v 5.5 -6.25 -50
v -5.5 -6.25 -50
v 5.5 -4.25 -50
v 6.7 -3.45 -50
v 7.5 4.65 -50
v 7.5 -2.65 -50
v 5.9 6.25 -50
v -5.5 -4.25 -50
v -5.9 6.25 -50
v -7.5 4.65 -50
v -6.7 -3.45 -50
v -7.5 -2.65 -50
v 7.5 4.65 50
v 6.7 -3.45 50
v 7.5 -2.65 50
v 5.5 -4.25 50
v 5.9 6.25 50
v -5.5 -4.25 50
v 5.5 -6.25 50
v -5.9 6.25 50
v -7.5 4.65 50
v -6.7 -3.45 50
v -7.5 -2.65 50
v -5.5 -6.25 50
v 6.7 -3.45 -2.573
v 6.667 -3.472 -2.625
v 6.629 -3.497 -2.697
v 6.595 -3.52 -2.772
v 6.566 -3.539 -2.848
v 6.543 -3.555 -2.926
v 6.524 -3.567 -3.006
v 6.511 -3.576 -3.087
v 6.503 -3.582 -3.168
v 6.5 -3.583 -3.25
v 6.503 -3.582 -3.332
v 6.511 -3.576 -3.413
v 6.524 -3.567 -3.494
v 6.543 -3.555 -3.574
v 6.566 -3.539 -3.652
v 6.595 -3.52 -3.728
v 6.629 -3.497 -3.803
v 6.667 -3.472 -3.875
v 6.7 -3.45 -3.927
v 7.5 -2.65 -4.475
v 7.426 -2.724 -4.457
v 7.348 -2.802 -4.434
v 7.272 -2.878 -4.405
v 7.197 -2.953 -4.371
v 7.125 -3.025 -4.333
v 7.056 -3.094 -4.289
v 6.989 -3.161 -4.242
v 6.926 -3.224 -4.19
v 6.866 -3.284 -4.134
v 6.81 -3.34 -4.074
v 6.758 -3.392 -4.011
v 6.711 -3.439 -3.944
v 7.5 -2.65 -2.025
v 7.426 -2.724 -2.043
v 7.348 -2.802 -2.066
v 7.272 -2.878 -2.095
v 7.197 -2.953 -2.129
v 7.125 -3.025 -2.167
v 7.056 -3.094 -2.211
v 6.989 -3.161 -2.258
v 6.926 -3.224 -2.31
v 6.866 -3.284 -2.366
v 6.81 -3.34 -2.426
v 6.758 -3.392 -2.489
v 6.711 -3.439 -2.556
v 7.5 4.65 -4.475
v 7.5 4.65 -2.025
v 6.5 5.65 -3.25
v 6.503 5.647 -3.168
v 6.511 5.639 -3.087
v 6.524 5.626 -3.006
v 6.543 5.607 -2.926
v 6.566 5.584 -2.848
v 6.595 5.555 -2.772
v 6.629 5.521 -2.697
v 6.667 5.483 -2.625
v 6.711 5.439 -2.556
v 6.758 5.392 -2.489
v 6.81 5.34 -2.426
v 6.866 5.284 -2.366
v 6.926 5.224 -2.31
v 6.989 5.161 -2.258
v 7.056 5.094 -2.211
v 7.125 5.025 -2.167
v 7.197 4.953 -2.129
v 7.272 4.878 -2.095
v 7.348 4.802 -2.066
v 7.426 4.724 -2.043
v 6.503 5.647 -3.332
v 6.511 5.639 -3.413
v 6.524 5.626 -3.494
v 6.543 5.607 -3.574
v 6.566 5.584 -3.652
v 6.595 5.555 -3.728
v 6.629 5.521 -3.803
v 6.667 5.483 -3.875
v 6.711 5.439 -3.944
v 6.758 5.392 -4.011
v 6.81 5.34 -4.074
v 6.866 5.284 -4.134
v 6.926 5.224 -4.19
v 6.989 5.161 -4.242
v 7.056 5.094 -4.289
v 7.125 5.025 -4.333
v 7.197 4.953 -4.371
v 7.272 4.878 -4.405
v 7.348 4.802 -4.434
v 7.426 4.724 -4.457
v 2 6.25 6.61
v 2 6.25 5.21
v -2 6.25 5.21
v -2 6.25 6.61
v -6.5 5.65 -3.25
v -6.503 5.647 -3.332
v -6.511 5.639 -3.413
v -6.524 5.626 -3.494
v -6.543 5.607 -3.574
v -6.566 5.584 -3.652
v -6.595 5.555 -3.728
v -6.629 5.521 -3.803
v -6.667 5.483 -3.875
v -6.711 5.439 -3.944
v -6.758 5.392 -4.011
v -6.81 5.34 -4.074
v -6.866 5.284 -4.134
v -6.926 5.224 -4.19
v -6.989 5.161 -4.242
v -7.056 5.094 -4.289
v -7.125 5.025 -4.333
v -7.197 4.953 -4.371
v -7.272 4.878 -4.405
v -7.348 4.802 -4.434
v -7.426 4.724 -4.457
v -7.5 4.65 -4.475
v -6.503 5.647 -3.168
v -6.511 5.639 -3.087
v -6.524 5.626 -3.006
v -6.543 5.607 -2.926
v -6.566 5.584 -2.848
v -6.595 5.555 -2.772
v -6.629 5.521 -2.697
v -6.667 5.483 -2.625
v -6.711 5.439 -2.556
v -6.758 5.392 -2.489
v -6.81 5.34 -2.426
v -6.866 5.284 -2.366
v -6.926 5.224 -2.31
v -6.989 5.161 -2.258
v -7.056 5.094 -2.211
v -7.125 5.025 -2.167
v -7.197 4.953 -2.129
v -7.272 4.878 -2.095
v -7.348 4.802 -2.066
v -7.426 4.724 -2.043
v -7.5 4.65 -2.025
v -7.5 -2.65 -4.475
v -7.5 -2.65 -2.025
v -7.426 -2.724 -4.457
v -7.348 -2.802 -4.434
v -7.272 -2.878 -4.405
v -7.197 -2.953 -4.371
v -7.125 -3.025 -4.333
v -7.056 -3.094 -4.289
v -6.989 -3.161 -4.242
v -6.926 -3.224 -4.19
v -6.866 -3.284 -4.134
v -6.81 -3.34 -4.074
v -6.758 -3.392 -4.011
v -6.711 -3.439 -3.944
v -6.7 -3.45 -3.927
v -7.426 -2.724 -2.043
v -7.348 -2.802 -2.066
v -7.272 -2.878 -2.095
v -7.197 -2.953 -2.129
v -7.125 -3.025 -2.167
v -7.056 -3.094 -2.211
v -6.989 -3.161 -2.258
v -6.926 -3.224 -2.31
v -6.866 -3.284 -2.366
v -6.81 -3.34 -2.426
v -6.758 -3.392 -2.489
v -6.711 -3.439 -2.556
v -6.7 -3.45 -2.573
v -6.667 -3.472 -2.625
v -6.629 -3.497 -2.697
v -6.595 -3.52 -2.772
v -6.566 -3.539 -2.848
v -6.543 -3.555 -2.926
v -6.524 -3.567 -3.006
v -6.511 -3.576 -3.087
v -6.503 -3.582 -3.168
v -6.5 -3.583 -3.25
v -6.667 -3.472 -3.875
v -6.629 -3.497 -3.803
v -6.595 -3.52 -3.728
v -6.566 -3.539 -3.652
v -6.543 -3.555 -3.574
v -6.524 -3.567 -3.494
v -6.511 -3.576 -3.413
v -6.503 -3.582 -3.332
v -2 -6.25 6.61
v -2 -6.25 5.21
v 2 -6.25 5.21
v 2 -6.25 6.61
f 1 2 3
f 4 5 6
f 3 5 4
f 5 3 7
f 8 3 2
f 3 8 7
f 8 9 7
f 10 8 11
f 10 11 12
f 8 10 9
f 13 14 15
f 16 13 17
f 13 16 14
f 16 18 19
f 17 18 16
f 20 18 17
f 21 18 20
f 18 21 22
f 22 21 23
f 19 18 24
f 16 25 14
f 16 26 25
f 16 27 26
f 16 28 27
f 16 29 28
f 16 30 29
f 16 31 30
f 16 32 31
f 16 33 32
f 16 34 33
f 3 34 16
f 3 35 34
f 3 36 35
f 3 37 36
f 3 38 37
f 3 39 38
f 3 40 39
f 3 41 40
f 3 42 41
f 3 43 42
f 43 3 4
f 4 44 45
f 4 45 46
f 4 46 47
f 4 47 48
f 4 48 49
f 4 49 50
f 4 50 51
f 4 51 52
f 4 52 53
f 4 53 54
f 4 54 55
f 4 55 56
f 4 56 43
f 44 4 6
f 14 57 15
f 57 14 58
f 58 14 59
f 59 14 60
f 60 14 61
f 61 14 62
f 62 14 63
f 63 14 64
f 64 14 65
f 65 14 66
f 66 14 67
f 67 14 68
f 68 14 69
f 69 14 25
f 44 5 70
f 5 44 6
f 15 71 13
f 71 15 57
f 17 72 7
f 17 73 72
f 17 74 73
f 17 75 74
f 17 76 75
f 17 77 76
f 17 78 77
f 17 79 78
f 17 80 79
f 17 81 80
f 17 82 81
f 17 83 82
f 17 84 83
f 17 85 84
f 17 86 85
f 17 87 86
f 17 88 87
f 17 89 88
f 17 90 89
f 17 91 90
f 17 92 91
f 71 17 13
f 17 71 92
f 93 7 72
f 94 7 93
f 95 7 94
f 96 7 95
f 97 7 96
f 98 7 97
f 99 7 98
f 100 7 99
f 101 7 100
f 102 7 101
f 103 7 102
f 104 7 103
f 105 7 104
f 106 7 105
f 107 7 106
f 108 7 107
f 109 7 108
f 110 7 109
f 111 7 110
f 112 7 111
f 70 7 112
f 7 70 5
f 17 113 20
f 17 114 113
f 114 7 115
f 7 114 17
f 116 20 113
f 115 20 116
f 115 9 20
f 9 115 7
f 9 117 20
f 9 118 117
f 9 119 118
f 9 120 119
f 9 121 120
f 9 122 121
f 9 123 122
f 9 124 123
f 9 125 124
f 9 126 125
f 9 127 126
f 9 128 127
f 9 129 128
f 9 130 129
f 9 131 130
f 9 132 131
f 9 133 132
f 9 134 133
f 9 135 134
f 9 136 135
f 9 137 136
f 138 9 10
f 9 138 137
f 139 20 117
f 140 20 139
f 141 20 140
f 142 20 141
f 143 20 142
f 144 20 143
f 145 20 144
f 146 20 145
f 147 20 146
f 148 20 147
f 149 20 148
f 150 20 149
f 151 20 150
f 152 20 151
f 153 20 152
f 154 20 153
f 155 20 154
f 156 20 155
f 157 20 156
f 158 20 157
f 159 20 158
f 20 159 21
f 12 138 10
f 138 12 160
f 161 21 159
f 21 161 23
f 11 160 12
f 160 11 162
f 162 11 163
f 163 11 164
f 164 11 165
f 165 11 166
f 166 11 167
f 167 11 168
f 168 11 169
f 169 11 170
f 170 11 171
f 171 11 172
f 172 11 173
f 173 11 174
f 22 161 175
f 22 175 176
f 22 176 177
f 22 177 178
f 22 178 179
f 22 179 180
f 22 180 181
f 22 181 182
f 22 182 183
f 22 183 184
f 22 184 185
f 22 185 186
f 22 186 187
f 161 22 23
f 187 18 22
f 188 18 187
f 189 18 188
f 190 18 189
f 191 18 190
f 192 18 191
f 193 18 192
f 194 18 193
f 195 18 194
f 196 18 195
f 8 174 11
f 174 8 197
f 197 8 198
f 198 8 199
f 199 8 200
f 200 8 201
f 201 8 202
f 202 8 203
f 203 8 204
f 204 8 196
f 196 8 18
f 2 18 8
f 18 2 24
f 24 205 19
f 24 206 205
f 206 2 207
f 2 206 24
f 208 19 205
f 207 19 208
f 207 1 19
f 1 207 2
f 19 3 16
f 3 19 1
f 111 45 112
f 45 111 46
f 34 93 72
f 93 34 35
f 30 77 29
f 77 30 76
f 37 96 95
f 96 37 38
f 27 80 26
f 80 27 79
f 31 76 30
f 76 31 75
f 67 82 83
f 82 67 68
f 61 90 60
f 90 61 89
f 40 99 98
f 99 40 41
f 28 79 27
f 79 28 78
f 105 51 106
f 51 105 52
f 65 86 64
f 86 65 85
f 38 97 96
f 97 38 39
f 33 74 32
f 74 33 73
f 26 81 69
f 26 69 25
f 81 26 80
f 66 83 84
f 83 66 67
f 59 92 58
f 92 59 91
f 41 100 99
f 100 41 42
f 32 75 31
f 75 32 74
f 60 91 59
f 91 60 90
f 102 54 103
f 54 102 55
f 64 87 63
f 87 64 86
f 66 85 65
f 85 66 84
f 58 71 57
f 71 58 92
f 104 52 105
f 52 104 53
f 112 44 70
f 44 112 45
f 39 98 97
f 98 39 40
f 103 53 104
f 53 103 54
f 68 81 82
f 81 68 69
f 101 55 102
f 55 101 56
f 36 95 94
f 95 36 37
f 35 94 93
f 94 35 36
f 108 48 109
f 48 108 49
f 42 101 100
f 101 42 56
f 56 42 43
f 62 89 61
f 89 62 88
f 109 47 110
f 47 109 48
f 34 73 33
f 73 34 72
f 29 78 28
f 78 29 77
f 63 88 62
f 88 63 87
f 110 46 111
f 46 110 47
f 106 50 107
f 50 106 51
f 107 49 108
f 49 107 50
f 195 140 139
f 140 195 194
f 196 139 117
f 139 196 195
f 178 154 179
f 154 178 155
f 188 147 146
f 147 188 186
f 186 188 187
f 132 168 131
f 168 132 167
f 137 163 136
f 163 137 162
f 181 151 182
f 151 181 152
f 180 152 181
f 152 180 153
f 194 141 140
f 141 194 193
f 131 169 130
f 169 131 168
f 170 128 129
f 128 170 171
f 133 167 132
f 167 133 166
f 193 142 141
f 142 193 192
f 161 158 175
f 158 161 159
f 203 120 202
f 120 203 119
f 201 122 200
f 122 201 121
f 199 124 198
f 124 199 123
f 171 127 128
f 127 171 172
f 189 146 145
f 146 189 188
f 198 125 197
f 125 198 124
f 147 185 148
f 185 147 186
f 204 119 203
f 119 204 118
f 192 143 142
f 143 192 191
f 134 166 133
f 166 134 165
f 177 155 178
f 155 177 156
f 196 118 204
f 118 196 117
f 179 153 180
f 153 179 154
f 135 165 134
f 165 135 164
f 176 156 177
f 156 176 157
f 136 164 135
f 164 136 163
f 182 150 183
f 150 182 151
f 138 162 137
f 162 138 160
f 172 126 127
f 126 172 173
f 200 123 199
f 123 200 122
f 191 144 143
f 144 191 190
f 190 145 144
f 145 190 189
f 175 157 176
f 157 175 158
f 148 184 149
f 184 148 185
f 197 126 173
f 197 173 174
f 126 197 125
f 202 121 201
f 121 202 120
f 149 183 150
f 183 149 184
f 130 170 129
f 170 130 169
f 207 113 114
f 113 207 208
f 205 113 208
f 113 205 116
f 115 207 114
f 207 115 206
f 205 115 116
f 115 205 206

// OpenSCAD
// Miniature linear guide rail (SSR15-like) — 15.0mm wide, 12.5mm tall, 100mm long
// Axes: X=width, Y=length, Z=height

$fn = 96;

// -------------------- Parameters --------------------
width_mm  = 15.0;
height_mm = 12.5;
length_mm = 100.0;

mounting_hole_diameter_mm = 3.2;   // through hole
countersink_diameter_mm   = 6.0;   // counterbore/countersink look
countersink_depth_mm      = 2.2;

mounting_hole_spacing_mm  = 25.0;
mounting_hole_count       = 4;

chamfer_mm                = 0.8;
overlap_mm                = 0.6;

// Profile detail (kept proportional; does not change overall W/H)
top_flat_w_mm      = 7.0;
bottom_flat_w_mm   = 11.0;
side_step_h_mm     = 2.0;

// Raceway grooves (side)
raceway_r_mm       = 1.25;
raceway_depth_mm   = 1.0;
raceway_z_mm       = 3.0;   // center height above bottom

// Top relief groove
top_groove_w_mm    = 4.0;
top_groove_d_mm    = 0.8;

// -------------------- Helpers --------------------
function clamp(v, lo, hi) = min(max(v, lo), hi);

ch = clamp(chamfer_mm, 0.2, min(width_mm, height_mm)/4);

top_flat_w    = clamp(top_flat_w_mm,    2.0, width_mm - 2*ch - 0.2);
bottom_flat_w = clamp(bottom_flat_w_mm, 3.0, width_mm - 2*ch - 0.2);
side_step_h   = clamp(side_step_h_mm,   0.8, height_mm/2.5);

raceway_r     = clamp(raceway_r_mm,     0.6, min(width_mm, height_mm)/5);
raceway_depth = clamp(raceway_depth_mm, 0.4, width_mm/4);
raceway_z     = clamp(raceway_z_mm, raceway_r + 0.4, height_mm - raceway_r - 0.6);

cs_d = clamp(countersink_diameter_mm, mounting_hole_diameter_mm + 1.0, width_mm - 2.0);
cs_h = clamp(countersink_depth_mm, 0.8, height_mm/3);

// -------------------- 2D rail cross-section (X-Z), extruded along Y --------------------
module rail_profile_2d() {
    w = width_mm;
    h = height_mm;

    z0 = -h/2;
    z1 = z0 + side_step_h;
    z2 =  h/2;

    xb = bottom_flat_w/2;
    xt = top_flat_w/2;

    // Clean, SSR-like stepped profile with chamfered top corners
    pts = [
        [-xb, z0],
        [ xb, z0],
        [ xb, z1],
        [ w/2 - ch, z1 + ch],
        [ w/2,      z1 + 2*ch],
        [ w/2,      z2 - 2*ch],
        [ w/2 - 2*ch, z2],
        [ xt, z2],
        [-xt, z2],
        [-w/2 + 2*ch, z2],
        [-w/2, z2 - 2*ch],
        [-w/2, z1 + 2*ch],
        [-w/2 + ch, z1 + ch],
        [-xb, z1]
    ];

    polygon(points=pts);
}

module rail_body() {
    linear_extrude(height=length_mm, center=true, convexity=12)
        rail_profile_2d();
}

// -------------------- Cutters --------------------
module mounting_hole_with_counterbore(y_pos) {
    // Through hole
    translate([0, y_pos, 0])
        cylinder(h=height_mm + 2*overlap_mm,
                 r=mounting_hole_diameter_mm/2,
                 center=true);

    // Counterbore from top face (Z+)
    translate([0, y_pos, height_mm/2 - cs_h/2 + overlap_mm*0.1])
        cylinder(h=cs_h + overlap_mm,
                 r=cs_d/2,
                 center=true);
}

module raceway_groove(side=1) {
    // side: +1 right, -1 left
    // Cylinder axis along Y, biting into side wall by raceway_depth
    x_center = side * (width_mm/2 - raceway_depth + raceway_r);
    z_center = -height_mm/2 + raceway_z;

    translate([x_center, 0, z_center])
        rotate([90, 0, 0])
            cylinder(h=length_mm + 2*overlap_mm, r=raceway_r, center=true);
}

module top_relief_groove() {
    groove_w = clamp(top_groove_w_mm, 2.0, top_flat_w - 0.6);
    groove_d = clamp(top_groove_d_mm, 0.4, height_mm/5);

    // Cut from the top surface downward
    translate([0, 0, height_mm/2 - groove_d/2 + overlap_mm*0.1])
        cube([groove_w, length_mm + 2*overlap_mm, groove_d + overlap_mm], center=true);
}

// -------------------- Rail --------------------
module rail() {
    difference() {
        rail_body();

        // Mounting holes along Y (centered pattern)
        y0 = -mounting_hole_spacing_mm*(mounting_hole_count-1)/2;
        for (i = [0:mounting_hole_count-1]) {
            mounting_hole_with_counterbore(y0 + i*mounting_hole_spacing_mm);
        }

        // Side raceways (both sides)
        raceway_groove( 1);
        raceway_groove(-1);

        // Top relief groove
        top_relief_groove();
    }
}

// Single connected solid
rail();
